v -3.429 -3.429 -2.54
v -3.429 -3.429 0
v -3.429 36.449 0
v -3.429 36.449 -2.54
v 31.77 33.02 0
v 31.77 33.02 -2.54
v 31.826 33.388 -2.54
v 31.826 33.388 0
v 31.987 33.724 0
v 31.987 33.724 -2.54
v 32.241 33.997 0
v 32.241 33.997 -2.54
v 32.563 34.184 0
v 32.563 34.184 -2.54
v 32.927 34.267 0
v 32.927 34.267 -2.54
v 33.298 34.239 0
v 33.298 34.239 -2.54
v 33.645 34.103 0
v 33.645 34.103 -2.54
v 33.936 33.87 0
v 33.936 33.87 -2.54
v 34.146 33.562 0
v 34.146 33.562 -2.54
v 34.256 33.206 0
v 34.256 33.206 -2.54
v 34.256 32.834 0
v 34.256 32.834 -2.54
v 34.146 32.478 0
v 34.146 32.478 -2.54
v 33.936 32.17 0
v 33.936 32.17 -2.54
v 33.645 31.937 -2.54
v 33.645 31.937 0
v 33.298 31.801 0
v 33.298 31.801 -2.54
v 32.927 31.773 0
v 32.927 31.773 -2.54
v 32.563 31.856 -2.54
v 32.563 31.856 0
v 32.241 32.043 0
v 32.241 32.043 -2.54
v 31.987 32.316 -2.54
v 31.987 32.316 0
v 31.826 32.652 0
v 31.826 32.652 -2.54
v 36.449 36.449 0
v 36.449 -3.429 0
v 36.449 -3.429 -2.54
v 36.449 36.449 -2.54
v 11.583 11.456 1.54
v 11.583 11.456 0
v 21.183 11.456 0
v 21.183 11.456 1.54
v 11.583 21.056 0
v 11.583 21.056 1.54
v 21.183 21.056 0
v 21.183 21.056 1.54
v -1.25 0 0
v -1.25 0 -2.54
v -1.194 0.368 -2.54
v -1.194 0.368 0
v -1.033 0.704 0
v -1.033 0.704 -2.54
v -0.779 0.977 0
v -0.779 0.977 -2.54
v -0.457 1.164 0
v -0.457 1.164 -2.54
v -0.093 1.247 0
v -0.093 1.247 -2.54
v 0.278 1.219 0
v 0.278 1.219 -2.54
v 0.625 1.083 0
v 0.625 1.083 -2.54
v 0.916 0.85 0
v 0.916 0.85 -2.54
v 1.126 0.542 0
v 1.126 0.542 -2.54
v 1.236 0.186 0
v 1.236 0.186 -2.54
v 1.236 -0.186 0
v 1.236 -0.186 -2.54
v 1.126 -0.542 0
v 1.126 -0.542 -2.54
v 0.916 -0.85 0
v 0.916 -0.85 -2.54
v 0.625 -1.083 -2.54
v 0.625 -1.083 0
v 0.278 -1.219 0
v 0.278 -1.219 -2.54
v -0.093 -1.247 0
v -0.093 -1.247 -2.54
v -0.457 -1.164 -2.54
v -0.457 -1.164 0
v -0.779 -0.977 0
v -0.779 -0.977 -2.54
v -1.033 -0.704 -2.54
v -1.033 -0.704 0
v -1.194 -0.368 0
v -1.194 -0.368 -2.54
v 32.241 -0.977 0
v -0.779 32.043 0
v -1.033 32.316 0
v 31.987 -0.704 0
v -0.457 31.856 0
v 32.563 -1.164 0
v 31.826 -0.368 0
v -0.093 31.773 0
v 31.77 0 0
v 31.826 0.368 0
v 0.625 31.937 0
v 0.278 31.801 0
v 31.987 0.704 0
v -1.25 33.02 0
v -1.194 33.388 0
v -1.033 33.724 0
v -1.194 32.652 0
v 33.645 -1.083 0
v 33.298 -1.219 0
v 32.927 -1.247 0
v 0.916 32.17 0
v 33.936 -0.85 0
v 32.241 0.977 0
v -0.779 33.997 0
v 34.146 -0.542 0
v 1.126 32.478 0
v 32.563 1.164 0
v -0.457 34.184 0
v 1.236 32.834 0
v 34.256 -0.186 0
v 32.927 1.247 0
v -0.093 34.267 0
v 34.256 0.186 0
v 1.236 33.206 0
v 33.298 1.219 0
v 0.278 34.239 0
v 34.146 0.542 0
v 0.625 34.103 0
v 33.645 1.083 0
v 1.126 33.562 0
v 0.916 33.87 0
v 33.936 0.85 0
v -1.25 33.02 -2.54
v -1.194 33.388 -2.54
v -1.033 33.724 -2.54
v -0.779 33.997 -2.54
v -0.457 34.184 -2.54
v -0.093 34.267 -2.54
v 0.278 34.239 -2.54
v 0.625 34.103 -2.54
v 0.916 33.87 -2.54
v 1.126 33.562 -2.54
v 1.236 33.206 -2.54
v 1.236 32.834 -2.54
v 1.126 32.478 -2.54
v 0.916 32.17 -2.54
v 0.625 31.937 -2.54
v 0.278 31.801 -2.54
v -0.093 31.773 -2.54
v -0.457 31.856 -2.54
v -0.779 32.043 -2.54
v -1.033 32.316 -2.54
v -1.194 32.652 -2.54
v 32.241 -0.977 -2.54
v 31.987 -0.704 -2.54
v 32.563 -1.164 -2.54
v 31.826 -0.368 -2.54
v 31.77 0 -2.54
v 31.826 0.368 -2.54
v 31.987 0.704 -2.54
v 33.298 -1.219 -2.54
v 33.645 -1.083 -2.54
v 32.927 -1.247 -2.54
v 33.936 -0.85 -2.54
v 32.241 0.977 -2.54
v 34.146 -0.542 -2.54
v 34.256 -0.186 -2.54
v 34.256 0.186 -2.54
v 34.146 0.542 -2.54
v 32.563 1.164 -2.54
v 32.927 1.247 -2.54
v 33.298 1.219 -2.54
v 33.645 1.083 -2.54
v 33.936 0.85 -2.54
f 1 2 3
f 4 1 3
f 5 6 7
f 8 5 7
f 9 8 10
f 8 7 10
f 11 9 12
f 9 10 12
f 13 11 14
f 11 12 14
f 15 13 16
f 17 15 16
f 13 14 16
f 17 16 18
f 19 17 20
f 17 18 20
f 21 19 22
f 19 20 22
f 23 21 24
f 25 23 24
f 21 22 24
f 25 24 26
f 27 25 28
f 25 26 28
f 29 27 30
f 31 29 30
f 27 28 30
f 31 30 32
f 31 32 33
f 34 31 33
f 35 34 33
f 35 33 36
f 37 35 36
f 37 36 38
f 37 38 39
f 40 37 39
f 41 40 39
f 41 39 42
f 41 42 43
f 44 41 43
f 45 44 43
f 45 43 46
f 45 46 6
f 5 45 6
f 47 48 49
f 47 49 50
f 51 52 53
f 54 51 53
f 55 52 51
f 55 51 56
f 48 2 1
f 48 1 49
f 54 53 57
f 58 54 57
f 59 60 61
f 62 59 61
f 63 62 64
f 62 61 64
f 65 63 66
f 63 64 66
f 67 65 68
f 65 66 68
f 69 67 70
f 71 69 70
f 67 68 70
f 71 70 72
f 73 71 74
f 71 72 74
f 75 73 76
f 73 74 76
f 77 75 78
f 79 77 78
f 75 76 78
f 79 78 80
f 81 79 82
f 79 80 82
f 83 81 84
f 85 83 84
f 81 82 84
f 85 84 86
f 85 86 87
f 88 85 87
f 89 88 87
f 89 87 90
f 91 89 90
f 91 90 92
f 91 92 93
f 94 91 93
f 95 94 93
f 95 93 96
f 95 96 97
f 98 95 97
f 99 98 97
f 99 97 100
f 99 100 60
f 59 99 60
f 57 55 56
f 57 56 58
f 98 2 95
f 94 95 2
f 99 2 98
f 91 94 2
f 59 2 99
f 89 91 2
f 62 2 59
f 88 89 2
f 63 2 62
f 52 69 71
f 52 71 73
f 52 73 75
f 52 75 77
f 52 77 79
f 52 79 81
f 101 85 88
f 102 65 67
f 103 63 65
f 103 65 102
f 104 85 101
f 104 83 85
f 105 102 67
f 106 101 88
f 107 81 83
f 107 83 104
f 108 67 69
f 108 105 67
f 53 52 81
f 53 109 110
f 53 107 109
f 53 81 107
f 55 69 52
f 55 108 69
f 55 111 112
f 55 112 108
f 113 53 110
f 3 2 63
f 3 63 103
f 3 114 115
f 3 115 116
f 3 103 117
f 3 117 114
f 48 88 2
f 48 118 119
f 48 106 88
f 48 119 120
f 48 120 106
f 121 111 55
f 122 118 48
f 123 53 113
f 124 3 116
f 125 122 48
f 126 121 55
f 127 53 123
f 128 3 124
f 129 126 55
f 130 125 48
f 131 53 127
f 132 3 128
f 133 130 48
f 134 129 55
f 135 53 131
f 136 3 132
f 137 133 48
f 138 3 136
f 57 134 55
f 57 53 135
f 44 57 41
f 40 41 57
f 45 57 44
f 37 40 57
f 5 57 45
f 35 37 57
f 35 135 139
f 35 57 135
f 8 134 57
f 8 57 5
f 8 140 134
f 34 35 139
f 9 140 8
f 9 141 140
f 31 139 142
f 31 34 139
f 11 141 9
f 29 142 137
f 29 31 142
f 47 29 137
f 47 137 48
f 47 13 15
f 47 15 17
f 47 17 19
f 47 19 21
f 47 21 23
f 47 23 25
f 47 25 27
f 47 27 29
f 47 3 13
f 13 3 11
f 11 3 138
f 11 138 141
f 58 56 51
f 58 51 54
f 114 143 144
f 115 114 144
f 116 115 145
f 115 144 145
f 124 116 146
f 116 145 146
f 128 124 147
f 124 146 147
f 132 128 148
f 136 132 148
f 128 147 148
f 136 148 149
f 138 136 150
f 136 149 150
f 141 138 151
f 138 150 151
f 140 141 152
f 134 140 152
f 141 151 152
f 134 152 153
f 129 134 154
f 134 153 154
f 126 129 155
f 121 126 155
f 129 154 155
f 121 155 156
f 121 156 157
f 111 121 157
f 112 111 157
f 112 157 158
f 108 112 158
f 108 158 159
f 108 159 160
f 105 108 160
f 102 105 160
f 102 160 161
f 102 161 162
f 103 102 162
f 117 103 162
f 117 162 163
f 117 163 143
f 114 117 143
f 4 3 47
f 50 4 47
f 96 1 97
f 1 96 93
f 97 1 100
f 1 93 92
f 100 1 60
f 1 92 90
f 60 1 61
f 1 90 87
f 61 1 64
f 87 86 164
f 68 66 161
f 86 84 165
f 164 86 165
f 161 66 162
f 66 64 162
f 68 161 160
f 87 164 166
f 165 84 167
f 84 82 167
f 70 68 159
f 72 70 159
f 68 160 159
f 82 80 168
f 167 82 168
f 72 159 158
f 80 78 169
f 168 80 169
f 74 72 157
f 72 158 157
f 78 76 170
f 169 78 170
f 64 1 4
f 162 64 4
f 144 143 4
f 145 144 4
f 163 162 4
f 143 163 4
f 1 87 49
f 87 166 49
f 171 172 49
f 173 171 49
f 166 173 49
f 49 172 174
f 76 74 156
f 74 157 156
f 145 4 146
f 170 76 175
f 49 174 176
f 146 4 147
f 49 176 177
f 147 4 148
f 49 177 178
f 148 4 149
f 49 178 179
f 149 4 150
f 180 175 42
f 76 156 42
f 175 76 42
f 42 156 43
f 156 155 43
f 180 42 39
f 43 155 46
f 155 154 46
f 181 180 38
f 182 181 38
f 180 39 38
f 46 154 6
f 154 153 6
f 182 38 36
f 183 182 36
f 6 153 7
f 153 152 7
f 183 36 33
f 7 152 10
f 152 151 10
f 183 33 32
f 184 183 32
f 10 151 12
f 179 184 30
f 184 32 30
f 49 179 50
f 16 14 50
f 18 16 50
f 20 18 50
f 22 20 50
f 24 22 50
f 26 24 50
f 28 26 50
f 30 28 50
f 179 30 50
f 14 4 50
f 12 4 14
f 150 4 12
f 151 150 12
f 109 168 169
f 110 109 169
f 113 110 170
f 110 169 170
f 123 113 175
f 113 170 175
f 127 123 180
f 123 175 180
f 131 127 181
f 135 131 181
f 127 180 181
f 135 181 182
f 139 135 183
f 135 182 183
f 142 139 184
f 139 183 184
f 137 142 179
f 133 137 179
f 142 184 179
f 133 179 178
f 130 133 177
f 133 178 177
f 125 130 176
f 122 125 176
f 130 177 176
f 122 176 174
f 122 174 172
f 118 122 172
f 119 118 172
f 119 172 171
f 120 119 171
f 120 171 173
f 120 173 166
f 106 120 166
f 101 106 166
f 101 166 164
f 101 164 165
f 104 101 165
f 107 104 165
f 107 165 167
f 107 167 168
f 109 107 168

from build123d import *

# Parameters (mm, degrees)
SCHIZZO2_W                   = 39.87805
SCHIZZO2_H                   = 39.87805
ESTRUSIONE_ESTRUSIONE1_DEPTH = 2.54
FORO_FILETTATO_M3X0_5_1_D    = 2.5
SCHIZZO5_W                   = 9.6
SCHIZZO5_H                   = 9.6
ESTRUSIONE_ESTRUSIONE2_DEPTH = 1.54


with BuildPart() as part:
    # Schizzo2 → Estrusione-Estrusione1 (new body)
    with BuildSketch(Plane.XY):
        with Locations((16.509975, 16.509975)):
            Rectangle(SCHIZZO2_W, SCHIZZO2_H)
    extrude(amount=-ESTRUSIONE_ESTRUSIONE1_DEPTH)

    # Foro filettato M3x0.5-1 (through all)
    with Locations(Plane.XY):
        with Locations((0, 33.02), (33.02, 33.02), (33.02, 0), (0, 0)):
            Hole(FORO_FILETTATO_M3X0_5_1_D / 2)

    # Schizzo5 → Estrusione-Estrusione2 (add)
    with BuildSketch(Plane.XY):
        with Locations((16.383, 16.256)):
            Rectangle(SCHIZZO5_W, SCHIZZO5_H)
    extrude(amount=ESTRUSIONE_ESTRUSIONE2_DEPTH)


solid = part.part
